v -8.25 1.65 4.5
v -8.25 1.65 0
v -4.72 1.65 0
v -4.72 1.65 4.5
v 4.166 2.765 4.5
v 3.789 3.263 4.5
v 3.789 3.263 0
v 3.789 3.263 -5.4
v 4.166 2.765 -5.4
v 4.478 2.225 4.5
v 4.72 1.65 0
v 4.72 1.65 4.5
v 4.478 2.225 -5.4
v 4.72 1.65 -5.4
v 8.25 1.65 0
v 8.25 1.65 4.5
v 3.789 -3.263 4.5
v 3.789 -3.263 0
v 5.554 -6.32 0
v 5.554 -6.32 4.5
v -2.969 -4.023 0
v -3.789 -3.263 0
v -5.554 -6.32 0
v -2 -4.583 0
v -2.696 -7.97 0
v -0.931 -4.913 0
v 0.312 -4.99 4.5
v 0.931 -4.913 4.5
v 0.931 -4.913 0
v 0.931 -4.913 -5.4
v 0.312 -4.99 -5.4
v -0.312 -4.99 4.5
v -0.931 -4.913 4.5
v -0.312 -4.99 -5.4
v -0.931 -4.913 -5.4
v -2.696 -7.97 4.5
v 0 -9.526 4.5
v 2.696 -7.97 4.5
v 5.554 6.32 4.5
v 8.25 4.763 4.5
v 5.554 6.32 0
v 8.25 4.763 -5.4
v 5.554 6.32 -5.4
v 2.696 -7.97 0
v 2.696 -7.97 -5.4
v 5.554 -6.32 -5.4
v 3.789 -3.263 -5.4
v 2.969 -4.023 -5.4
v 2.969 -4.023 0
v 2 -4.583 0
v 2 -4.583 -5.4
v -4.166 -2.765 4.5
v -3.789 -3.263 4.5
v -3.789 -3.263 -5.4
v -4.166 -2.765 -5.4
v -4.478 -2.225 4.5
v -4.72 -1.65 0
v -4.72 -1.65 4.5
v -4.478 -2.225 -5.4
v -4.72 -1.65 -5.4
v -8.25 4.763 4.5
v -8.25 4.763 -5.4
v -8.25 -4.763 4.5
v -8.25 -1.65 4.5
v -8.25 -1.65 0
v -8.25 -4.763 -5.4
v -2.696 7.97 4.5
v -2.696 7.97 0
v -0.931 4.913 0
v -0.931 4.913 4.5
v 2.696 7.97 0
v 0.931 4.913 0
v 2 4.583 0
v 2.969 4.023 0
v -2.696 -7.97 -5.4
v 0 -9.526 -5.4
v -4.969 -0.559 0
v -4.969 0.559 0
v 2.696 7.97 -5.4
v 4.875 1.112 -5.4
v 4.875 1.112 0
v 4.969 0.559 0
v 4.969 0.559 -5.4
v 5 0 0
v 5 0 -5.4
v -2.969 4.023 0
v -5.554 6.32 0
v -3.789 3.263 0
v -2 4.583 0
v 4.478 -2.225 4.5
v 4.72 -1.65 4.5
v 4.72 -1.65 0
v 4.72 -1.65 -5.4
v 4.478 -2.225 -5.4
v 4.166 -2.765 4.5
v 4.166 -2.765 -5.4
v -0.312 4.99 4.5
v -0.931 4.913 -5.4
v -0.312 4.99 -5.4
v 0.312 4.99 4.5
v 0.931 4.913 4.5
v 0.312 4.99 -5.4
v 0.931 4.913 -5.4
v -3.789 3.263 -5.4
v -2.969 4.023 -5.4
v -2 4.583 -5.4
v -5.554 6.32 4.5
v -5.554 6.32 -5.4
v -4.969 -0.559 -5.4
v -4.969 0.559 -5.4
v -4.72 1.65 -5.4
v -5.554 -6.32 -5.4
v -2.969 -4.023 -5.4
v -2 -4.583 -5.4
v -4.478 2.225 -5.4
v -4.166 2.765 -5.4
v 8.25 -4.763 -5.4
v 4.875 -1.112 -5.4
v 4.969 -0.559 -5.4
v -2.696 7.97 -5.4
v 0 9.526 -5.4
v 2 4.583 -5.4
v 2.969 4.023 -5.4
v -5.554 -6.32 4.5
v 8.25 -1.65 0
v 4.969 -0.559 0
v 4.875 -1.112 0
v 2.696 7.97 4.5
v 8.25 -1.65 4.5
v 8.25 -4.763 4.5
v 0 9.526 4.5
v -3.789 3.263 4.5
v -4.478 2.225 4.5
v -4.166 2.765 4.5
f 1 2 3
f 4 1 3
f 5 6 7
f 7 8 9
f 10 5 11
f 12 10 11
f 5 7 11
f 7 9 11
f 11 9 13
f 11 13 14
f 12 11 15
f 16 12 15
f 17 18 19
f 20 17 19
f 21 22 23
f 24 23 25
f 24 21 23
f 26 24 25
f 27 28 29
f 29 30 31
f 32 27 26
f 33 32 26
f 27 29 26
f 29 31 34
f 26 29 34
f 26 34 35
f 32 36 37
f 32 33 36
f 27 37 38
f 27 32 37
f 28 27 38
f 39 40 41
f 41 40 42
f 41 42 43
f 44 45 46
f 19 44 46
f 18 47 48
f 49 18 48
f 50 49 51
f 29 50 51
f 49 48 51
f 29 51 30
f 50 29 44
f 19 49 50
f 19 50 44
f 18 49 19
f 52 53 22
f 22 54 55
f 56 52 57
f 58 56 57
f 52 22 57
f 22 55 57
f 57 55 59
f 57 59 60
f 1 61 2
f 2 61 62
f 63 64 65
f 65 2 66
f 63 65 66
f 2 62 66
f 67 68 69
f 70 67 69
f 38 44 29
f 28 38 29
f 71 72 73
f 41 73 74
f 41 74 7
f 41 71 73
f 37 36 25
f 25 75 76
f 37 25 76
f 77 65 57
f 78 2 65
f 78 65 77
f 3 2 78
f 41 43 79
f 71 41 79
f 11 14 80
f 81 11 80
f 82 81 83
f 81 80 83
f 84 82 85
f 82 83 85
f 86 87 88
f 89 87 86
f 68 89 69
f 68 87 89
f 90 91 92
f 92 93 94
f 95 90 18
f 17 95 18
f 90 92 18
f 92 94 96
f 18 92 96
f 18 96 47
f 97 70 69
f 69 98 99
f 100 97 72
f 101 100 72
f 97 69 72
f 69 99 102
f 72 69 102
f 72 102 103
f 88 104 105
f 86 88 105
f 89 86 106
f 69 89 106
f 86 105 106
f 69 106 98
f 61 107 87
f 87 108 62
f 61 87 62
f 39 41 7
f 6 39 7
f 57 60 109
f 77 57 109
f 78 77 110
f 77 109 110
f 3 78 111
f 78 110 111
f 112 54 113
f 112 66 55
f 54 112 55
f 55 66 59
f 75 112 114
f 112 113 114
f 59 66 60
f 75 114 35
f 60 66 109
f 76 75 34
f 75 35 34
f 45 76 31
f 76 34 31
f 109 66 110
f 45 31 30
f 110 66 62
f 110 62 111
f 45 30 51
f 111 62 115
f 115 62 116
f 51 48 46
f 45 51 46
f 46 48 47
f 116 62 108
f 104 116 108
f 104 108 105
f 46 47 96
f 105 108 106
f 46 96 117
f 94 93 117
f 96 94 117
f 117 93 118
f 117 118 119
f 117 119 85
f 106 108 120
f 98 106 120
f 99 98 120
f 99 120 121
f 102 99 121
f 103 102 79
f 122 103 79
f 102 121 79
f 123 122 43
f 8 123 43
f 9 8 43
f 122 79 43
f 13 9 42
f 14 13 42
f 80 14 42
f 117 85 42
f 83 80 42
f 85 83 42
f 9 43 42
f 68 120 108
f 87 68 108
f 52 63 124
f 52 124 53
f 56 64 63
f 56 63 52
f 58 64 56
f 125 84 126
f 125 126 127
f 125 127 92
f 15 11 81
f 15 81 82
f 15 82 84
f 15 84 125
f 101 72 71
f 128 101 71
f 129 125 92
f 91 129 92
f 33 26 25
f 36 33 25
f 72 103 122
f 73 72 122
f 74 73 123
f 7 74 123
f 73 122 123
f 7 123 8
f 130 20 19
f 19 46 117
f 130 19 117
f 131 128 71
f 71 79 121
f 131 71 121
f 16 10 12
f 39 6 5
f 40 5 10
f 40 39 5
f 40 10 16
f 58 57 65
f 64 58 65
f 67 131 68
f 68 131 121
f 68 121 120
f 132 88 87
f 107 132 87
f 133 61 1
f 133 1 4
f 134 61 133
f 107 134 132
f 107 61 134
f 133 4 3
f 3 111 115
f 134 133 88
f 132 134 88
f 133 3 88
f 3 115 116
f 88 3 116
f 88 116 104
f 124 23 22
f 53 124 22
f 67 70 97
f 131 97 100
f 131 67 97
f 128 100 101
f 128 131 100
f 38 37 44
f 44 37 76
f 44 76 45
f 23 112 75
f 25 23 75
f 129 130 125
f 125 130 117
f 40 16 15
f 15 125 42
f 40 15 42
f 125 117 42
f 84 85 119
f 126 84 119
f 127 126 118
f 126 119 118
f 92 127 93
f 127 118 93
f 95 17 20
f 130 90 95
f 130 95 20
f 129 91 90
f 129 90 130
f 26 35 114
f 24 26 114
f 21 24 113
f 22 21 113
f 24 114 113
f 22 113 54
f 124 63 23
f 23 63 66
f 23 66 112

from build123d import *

# Parameters (mm, degrees)
EXTRUDE_1_DEPTH   = 4.5
EXTRUDE_1_2_DEPTH = 4.5
EXTRUDE_1_3_DEPTH = 4.5
EXTRUDE_1_4_DEPTH = 4.5
EXTRUDE_1_5_DEPTH = 4.5
EXTRUDE_1_6_DEPTH = 4.5
EXTRUDE_START     = -5.4
SKETCH_1_4_R      = 5
EXTRUDE_2_DEPTH   = 5.4


with BuildPart() as part:
    # 草图1 → 凸台-拉伸1 (new body)
    with BuildSketch(Plane.XY):
        with BuildLine():
            Line((-2.696058084, -7.969709581), (0, -9.526279442))
            Line((0, -9.526279442), (2.696058084, -7.969709581))
            Line((2.696058084, -7.969709581), (0.931010414, -4.912557339))
            ThreePointArc((0.931010414, -4.912557339), (0, -5), (-0.931010414, -4.912557339))
            Line((-0.931010414, -4.912557339), (-2.696058084, -7.969709581))
        make_face()
    extrude(amount=EXTRUDE_1_DEPTH)



with BuildPart() as body_2:
    # 草图1 → Extrude 1 2 (new body)
    with BuildSketch(Plane.XY):
        with BuildLine():
            Line((3.788894246, -3.262557339), (5.553941916, -6.319709581))
            Line((5.553941916, -6.319709581), (8.25, -4.763139721))
            Line((8.25, -4.763139721), (8.25, -1.65))
            Line((8.25, -1.65), (4.71990466, -1.65))
            ThreePointArc((4.71990466, -1.65), (4.330127019, -2.5), (3.788894246, -3.262557339))
        make_face()
    extrude(amount=EXTRUDE_1_2_DEPTH)


with BuildPart() as body_3:
    # 草图1 → Extrude 1 3 (new body)
    with BuildSketch(Plane.XY):
        with BuildLine():
            Line((-8.25, -4.763139721), (-5.553941916, -6.319709581))
            Line((-5.553941916, -6.319709581), (-3.788894246, -3.262557339))
            ThreePointArc((-3.788894246, -3.262557339), (-4.330127019, -2.5), (-4.71990466, -1.65))
            Line((-4.71990466, -1.65), (-8.25, -1.65))
            Line((-8.25, -1.65), (-8.25, -4.763139721))
        make_face()
    extrude(amount=EXTRUDE_1_3_DEPTH)


with BuildPart() as body_4:
    # 草图1 → Extrude 1 4 (new body)
    with BuildSketch(Plane.XY):
        with BuildLine():
            Line((4.71990466, 1.65), (8.25, 1.65))
            Line((8.25, 1.65), (8.25, 4.763139721))
            Line((8.25, 4.763139721), (5.553941916, 6.319709581))
            Line((5.553941916, 6.319709581), (3.788894246, 3.262557339))
            ThreePointArc((3.788894246, 3.262557339), (4.330127019, 2.5), (4.71990466, 1.65))
        make_face()
    extrude(amount=EXTRUDE_1_4_DEPTH)


with BuildPart() as body_5:
    # 草图1 → Extrude 1 5 (new body)
    with BuildSketch(Plane.XY):
        with BuildLine():
            Line((-8.25, 4.763139721), (-8.25, 1.65))
            Line((-8.25, 1.65), (-4.71990466, 1.65))
            ThreePointArc((-4.71990466, 1.65), (-4.330127019, 2.5), (-3.788894246, 3.262557339))
            Line((-3.788894246, 3.262557339), (-5.553941916, 6.319709581))
            Line((-5.553941916, 6.319709581), (-8.25, 4.763139721))
        make_face()
    extrude(amount=EXTRUDE_1_5_DEPTH)


with BuildPart() as body_6:
    # 草图1 → Extrude 1 6 (new body)
    with BuildSketch(Plane.XY):
        with BuildLine():
            Line((-2.696058084, 7.969709581), (-0.931010414, 4.912557339))
            ThreePointArc((-0.931010414, 4.912557339), (0, 5), (0.931010414, 4.912557339))
            Line((0.931010414, 4.912557339), (2.696058084, 7.969709581))
            Line((2.696058084, 7.969709581), (0, 9.526279442))
            Line((0, 9.526279442), (-2.696058084, 7.969709581))
        make_face()
    extrude(amount=EXTRUDE_1_6_DEPTH)


with BuildPart() as part_1:
    add(part.part)

    add(body_2.part)  # 凸台-拉伸2 merges body 2

    add(body_3.part)  # 凸台-拉伸2 merges body 3

    add(body_4.part)  # 凸台-拉伸2 merges body 4

    add(body_5.part)  # 凸台-拉伸2 merges body 5

    add(body_6.part)  # 凸台-拉伸2 merges body 6
    # 草图1<4> → 凸台-拉伸2 (add)
    with BuildSketch(Plane.XY.offset(EXTRUDE_START)):
        Polygon((0, -9.526279442), (8.25, -4.763139721), (8.25, 4.763139721), (0, 9.526279442), (-8.25, 4.763139721), (-8.25, -4.763139721), align=None)
        Circle(SKETCH_1_4_R, mode=Mode.SUBTRACT)
    extrude(amount=EXTRUDE_2_DEPTH)


solid = part_1.part
